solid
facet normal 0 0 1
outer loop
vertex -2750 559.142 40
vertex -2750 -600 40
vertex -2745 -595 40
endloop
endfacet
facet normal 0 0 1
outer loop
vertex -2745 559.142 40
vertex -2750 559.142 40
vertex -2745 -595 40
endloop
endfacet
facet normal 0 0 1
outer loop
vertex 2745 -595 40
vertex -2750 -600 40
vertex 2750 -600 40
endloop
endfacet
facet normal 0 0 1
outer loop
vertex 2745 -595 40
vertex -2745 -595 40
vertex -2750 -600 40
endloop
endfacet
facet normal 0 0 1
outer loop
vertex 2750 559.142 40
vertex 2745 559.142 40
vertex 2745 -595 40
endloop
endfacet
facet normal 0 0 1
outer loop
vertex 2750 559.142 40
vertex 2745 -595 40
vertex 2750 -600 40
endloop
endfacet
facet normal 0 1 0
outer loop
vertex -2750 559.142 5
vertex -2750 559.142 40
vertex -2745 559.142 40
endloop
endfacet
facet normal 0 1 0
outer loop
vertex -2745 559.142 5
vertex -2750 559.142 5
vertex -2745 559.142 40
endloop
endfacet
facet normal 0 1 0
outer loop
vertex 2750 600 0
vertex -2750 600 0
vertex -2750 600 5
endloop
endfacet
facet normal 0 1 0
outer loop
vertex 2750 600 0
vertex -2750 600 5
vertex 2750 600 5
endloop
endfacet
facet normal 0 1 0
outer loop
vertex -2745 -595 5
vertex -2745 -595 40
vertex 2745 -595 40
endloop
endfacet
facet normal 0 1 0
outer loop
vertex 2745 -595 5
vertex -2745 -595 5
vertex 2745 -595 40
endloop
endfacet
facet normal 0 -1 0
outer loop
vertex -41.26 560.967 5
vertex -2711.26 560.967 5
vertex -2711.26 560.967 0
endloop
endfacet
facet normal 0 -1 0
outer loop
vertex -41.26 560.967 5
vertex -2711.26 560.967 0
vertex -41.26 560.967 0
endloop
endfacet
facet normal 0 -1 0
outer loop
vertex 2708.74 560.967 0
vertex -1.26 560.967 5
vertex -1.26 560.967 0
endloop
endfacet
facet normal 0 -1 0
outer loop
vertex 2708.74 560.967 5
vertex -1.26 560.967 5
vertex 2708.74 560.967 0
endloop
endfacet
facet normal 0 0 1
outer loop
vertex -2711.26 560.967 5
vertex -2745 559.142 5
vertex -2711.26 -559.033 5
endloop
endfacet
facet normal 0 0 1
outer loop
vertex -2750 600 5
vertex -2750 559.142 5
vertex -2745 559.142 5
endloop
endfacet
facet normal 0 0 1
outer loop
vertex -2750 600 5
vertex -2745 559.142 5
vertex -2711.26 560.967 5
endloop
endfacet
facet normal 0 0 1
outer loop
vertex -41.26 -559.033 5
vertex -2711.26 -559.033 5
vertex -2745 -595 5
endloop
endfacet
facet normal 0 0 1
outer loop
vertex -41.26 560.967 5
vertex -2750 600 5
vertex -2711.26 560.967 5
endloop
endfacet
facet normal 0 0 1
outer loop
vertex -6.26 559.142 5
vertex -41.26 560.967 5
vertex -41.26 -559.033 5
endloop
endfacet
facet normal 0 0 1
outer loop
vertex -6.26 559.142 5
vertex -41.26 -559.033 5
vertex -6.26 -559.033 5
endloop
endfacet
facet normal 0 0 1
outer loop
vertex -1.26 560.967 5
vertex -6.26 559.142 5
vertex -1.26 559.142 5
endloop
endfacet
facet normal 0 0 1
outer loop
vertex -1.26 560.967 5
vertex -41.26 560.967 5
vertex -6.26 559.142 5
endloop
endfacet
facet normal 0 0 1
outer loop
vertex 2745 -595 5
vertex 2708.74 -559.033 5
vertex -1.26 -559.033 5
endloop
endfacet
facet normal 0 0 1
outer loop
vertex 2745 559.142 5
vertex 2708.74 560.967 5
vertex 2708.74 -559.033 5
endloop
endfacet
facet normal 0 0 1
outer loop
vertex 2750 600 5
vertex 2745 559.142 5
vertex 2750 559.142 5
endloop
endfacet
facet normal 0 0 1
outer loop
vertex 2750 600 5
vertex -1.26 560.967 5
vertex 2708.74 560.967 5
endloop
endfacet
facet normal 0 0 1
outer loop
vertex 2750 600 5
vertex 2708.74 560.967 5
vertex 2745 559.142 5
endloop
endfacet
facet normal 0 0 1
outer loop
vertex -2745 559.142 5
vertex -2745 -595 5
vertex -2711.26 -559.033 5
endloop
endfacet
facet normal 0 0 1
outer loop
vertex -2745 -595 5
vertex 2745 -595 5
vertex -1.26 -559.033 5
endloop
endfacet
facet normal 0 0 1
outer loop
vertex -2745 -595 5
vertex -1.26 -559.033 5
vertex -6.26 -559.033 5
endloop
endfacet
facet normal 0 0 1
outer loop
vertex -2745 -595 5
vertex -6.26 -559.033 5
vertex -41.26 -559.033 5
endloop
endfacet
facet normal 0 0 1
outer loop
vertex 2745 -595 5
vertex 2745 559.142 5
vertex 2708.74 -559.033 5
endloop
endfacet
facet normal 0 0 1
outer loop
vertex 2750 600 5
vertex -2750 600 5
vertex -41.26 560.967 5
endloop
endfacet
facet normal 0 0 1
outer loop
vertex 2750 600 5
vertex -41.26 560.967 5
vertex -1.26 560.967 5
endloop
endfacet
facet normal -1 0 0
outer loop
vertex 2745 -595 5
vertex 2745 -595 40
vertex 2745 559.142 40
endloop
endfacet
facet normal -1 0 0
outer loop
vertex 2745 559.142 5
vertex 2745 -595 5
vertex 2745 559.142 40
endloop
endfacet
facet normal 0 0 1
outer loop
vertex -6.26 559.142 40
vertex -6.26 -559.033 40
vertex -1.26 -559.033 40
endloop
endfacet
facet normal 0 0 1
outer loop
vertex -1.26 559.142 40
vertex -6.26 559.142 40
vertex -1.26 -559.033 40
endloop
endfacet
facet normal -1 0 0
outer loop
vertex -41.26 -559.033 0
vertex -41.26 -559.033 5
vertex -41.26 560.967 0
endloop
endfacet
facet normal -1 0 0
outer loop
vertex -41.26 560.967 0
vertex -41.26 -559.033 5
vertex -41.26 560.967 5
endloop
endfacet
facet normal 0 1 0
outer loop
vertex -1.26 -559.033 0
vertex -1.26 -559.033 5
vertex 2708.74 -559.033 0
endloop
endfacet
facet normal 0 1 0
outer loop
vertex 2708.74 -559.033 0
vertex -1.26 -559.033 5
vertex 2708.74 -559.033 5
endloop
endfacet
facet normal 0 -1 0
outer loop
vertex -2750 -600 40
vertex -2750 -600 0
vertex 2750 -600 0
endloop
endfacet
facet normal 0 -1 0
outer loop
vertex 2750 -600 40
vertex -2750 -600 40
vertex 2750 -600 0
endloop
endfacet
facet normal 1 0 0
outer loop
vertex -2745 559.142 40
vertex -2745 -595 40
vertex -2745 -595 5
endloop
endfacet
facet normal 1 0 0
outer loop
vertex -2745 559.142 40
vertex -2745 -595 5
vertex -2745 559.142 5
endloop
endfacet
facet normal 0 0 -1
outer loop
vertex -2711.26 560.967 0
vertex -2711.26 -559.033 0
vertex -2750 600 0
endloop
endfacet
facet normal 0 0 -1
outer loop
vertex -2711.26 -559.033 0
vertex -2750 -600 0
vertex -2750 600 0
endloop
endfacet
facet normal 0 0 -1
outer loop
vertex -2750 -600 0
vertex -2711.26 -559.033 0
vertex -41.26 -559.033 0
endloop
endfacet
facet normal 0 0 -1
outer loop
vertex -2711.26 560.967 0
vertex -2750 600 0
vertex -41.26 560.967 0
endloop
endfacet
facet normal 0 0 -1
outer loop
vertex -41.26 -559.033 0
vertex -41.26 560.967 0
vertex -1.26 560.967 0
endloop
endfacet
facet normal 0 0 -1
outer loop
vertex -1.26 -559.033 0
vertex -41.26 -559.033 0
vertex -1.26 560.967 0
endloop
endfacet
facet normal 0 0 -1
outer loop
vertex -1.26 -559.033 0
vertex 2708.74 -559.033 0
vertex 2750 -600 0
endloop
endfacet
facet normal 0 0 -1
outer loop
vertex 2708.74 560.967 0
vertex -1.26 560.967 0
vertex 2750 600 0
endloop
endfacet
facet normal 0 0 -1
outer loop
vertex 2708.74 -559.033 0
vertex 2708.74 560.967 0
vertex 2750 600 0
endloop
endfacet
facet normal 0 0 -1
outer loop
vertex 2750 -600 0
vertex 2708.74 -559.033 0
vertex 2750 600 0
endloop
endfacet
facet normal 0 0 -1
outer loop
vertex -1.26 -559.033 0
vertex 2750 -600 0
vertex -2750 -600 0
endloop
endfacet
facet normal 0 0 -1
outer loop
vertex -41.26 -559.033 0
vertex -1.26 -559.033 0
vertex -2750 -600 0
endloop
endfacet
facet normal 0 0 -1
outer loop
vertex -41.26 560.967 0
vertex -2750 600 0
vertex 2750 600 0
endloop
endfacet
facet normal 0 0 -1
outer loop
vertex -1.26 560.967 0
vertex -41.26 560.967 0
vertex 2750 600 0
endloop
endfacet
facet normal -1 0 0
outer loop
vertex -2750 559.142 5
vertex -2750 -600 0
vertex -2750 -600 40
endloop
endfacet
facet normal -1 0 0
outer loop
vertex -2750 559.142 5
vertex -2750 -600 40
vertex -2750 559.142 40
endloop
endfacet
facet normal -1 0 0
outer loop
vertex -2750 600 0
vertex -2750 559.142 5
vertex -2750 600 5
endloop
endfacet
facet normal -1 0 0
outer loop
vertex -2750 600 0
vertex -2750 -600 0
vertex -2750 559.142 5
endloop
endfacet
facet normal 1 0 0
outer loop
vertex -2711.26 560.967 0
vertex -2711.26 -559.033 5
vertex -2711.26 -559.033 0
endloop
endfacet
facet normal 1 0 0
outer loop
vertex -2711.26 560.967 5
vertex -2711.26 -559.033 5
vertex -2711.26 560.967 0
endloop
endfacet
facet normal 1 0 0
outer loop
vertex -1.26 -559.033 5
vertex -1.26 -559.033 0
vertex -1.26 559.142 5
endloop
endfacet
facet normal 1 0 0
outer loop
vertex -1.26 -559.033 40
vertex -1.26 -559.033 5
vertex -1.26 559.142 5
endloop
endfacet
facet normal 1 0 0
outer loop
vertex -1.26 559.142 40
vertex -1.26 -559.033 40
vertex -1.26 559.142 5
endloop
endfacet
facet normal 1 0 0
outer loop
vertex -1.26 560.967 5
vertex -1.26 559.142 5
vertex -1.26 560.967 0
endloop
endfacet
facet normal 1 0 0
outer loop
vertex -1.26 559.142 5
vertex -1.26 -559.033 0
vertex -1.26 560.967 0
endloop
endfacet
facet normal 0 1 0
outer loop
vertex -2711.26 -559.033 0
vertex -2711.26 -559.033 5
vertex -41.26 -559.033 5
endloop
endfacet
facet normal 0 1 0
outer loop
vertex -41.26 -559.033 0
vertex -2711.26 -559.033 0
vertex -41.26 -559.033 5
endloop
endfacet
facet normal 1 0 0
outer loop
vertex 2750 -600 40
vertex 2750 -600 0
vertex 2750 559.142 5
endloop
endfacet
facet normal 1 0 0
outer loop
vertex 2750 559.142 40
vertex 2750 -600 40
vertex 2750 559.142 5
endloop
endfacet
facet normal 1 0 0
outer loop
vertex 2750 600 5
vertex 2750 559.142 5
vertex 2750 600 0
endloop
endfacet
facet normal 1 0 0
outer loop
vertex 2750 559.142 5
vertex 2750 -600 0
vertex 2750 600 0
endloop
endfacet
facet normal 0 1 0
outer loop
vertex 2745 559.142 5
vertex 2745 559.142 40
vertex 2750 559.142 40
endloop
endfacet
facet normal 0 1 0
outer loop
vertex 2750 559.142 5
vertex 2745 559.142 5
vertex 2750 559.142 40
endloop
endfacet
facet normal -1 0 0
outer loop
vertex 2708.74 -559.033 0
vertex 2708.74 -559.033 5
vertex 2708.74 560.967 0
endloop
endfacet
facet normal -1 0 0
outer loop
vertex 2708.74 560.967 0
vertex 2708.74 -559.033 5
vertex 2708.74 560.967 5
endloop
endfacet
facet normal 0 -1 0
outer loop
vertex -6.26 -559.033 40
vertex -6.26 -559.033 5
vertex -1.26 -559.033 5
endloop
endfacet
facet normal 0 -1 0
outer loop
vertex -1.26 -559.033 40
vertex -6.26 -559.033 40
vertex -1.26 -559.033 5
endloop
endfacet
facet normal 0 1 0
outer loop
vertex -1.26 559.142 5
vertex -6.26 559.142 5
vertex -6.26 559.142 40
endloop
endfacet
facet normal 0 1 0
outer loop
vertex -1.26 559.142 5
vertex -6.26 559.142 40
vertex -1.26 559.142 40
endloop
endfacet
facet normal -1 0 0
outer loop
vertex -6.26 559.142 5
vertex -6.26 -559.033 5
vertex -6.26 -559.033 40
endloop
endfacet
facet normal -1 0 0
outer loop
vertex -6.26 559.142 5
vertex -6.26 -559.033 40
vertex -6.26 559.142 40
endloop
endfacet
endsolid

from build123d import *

# Parameters (mm, degrees)
F0_W     = 5500
F0_H     = 1200
F1_DEPTH = 40
F2_W     = 5490
F2_H     = 1190
F3_DEPTH = 35
F4_W     = 2670
F4_H     = 1120
F4_W_2   = 2710
F5_DEPTH = 25
F6_W     = 5
F6_H     = 1120
F7_DEPTH = 35
F8_W     = 5572.749853
F8_H     = 78.416228
F9_DEPTH = 35


with BuildPart() as f1:
    # F0 (on Top) → F1 (new body)
    with BuildSketch(Plane.XY):
        Rectangle(F0_W, F0_H)
    extrude(amount=F1_DEPTH)

    # F2 (on face) → F3 (cut)
    with BuildSketch(Plane.XY.offset(40)):
        Rectangle(F2_W, F2_H)
    extrude(amount=-F3_DEPTH, mode=Mode.SUBTRACT)

    # F4 (on face) → F5 (cut)
    with BuildSketch(Plane.XY.offset(5)):
        with Locations((-1376.259804, 0.967228)):
            Rectangle(F4_W, F4_H)
        with Locations((1353.740196, 0.967228)):
            Rectangle(F4_W_2, F4_H)
    extrude(amount=-F5_DEPTH, mode=Mode.SUBTRACT)

    # F6 (on face) → F7 (join)
    with BuildSketch(Plane.XY.offset(5)):
        with Locations((-3.759804, 0.967228)):
            Rectangle(F6_W, F6_H)
    extrude(amount=F7_DEPTH)

    # F8 (on face) → F9 (cut)
    with BuildSketch(Plane.XY.offset(40)):
        with Locations((36.374926, 598.350167)):
            Rectangle(F8_W, F8_H)
    extrude(amount=-F9_DEPTH, mode=Mode.SUBTRACT)


solid = f1.part
